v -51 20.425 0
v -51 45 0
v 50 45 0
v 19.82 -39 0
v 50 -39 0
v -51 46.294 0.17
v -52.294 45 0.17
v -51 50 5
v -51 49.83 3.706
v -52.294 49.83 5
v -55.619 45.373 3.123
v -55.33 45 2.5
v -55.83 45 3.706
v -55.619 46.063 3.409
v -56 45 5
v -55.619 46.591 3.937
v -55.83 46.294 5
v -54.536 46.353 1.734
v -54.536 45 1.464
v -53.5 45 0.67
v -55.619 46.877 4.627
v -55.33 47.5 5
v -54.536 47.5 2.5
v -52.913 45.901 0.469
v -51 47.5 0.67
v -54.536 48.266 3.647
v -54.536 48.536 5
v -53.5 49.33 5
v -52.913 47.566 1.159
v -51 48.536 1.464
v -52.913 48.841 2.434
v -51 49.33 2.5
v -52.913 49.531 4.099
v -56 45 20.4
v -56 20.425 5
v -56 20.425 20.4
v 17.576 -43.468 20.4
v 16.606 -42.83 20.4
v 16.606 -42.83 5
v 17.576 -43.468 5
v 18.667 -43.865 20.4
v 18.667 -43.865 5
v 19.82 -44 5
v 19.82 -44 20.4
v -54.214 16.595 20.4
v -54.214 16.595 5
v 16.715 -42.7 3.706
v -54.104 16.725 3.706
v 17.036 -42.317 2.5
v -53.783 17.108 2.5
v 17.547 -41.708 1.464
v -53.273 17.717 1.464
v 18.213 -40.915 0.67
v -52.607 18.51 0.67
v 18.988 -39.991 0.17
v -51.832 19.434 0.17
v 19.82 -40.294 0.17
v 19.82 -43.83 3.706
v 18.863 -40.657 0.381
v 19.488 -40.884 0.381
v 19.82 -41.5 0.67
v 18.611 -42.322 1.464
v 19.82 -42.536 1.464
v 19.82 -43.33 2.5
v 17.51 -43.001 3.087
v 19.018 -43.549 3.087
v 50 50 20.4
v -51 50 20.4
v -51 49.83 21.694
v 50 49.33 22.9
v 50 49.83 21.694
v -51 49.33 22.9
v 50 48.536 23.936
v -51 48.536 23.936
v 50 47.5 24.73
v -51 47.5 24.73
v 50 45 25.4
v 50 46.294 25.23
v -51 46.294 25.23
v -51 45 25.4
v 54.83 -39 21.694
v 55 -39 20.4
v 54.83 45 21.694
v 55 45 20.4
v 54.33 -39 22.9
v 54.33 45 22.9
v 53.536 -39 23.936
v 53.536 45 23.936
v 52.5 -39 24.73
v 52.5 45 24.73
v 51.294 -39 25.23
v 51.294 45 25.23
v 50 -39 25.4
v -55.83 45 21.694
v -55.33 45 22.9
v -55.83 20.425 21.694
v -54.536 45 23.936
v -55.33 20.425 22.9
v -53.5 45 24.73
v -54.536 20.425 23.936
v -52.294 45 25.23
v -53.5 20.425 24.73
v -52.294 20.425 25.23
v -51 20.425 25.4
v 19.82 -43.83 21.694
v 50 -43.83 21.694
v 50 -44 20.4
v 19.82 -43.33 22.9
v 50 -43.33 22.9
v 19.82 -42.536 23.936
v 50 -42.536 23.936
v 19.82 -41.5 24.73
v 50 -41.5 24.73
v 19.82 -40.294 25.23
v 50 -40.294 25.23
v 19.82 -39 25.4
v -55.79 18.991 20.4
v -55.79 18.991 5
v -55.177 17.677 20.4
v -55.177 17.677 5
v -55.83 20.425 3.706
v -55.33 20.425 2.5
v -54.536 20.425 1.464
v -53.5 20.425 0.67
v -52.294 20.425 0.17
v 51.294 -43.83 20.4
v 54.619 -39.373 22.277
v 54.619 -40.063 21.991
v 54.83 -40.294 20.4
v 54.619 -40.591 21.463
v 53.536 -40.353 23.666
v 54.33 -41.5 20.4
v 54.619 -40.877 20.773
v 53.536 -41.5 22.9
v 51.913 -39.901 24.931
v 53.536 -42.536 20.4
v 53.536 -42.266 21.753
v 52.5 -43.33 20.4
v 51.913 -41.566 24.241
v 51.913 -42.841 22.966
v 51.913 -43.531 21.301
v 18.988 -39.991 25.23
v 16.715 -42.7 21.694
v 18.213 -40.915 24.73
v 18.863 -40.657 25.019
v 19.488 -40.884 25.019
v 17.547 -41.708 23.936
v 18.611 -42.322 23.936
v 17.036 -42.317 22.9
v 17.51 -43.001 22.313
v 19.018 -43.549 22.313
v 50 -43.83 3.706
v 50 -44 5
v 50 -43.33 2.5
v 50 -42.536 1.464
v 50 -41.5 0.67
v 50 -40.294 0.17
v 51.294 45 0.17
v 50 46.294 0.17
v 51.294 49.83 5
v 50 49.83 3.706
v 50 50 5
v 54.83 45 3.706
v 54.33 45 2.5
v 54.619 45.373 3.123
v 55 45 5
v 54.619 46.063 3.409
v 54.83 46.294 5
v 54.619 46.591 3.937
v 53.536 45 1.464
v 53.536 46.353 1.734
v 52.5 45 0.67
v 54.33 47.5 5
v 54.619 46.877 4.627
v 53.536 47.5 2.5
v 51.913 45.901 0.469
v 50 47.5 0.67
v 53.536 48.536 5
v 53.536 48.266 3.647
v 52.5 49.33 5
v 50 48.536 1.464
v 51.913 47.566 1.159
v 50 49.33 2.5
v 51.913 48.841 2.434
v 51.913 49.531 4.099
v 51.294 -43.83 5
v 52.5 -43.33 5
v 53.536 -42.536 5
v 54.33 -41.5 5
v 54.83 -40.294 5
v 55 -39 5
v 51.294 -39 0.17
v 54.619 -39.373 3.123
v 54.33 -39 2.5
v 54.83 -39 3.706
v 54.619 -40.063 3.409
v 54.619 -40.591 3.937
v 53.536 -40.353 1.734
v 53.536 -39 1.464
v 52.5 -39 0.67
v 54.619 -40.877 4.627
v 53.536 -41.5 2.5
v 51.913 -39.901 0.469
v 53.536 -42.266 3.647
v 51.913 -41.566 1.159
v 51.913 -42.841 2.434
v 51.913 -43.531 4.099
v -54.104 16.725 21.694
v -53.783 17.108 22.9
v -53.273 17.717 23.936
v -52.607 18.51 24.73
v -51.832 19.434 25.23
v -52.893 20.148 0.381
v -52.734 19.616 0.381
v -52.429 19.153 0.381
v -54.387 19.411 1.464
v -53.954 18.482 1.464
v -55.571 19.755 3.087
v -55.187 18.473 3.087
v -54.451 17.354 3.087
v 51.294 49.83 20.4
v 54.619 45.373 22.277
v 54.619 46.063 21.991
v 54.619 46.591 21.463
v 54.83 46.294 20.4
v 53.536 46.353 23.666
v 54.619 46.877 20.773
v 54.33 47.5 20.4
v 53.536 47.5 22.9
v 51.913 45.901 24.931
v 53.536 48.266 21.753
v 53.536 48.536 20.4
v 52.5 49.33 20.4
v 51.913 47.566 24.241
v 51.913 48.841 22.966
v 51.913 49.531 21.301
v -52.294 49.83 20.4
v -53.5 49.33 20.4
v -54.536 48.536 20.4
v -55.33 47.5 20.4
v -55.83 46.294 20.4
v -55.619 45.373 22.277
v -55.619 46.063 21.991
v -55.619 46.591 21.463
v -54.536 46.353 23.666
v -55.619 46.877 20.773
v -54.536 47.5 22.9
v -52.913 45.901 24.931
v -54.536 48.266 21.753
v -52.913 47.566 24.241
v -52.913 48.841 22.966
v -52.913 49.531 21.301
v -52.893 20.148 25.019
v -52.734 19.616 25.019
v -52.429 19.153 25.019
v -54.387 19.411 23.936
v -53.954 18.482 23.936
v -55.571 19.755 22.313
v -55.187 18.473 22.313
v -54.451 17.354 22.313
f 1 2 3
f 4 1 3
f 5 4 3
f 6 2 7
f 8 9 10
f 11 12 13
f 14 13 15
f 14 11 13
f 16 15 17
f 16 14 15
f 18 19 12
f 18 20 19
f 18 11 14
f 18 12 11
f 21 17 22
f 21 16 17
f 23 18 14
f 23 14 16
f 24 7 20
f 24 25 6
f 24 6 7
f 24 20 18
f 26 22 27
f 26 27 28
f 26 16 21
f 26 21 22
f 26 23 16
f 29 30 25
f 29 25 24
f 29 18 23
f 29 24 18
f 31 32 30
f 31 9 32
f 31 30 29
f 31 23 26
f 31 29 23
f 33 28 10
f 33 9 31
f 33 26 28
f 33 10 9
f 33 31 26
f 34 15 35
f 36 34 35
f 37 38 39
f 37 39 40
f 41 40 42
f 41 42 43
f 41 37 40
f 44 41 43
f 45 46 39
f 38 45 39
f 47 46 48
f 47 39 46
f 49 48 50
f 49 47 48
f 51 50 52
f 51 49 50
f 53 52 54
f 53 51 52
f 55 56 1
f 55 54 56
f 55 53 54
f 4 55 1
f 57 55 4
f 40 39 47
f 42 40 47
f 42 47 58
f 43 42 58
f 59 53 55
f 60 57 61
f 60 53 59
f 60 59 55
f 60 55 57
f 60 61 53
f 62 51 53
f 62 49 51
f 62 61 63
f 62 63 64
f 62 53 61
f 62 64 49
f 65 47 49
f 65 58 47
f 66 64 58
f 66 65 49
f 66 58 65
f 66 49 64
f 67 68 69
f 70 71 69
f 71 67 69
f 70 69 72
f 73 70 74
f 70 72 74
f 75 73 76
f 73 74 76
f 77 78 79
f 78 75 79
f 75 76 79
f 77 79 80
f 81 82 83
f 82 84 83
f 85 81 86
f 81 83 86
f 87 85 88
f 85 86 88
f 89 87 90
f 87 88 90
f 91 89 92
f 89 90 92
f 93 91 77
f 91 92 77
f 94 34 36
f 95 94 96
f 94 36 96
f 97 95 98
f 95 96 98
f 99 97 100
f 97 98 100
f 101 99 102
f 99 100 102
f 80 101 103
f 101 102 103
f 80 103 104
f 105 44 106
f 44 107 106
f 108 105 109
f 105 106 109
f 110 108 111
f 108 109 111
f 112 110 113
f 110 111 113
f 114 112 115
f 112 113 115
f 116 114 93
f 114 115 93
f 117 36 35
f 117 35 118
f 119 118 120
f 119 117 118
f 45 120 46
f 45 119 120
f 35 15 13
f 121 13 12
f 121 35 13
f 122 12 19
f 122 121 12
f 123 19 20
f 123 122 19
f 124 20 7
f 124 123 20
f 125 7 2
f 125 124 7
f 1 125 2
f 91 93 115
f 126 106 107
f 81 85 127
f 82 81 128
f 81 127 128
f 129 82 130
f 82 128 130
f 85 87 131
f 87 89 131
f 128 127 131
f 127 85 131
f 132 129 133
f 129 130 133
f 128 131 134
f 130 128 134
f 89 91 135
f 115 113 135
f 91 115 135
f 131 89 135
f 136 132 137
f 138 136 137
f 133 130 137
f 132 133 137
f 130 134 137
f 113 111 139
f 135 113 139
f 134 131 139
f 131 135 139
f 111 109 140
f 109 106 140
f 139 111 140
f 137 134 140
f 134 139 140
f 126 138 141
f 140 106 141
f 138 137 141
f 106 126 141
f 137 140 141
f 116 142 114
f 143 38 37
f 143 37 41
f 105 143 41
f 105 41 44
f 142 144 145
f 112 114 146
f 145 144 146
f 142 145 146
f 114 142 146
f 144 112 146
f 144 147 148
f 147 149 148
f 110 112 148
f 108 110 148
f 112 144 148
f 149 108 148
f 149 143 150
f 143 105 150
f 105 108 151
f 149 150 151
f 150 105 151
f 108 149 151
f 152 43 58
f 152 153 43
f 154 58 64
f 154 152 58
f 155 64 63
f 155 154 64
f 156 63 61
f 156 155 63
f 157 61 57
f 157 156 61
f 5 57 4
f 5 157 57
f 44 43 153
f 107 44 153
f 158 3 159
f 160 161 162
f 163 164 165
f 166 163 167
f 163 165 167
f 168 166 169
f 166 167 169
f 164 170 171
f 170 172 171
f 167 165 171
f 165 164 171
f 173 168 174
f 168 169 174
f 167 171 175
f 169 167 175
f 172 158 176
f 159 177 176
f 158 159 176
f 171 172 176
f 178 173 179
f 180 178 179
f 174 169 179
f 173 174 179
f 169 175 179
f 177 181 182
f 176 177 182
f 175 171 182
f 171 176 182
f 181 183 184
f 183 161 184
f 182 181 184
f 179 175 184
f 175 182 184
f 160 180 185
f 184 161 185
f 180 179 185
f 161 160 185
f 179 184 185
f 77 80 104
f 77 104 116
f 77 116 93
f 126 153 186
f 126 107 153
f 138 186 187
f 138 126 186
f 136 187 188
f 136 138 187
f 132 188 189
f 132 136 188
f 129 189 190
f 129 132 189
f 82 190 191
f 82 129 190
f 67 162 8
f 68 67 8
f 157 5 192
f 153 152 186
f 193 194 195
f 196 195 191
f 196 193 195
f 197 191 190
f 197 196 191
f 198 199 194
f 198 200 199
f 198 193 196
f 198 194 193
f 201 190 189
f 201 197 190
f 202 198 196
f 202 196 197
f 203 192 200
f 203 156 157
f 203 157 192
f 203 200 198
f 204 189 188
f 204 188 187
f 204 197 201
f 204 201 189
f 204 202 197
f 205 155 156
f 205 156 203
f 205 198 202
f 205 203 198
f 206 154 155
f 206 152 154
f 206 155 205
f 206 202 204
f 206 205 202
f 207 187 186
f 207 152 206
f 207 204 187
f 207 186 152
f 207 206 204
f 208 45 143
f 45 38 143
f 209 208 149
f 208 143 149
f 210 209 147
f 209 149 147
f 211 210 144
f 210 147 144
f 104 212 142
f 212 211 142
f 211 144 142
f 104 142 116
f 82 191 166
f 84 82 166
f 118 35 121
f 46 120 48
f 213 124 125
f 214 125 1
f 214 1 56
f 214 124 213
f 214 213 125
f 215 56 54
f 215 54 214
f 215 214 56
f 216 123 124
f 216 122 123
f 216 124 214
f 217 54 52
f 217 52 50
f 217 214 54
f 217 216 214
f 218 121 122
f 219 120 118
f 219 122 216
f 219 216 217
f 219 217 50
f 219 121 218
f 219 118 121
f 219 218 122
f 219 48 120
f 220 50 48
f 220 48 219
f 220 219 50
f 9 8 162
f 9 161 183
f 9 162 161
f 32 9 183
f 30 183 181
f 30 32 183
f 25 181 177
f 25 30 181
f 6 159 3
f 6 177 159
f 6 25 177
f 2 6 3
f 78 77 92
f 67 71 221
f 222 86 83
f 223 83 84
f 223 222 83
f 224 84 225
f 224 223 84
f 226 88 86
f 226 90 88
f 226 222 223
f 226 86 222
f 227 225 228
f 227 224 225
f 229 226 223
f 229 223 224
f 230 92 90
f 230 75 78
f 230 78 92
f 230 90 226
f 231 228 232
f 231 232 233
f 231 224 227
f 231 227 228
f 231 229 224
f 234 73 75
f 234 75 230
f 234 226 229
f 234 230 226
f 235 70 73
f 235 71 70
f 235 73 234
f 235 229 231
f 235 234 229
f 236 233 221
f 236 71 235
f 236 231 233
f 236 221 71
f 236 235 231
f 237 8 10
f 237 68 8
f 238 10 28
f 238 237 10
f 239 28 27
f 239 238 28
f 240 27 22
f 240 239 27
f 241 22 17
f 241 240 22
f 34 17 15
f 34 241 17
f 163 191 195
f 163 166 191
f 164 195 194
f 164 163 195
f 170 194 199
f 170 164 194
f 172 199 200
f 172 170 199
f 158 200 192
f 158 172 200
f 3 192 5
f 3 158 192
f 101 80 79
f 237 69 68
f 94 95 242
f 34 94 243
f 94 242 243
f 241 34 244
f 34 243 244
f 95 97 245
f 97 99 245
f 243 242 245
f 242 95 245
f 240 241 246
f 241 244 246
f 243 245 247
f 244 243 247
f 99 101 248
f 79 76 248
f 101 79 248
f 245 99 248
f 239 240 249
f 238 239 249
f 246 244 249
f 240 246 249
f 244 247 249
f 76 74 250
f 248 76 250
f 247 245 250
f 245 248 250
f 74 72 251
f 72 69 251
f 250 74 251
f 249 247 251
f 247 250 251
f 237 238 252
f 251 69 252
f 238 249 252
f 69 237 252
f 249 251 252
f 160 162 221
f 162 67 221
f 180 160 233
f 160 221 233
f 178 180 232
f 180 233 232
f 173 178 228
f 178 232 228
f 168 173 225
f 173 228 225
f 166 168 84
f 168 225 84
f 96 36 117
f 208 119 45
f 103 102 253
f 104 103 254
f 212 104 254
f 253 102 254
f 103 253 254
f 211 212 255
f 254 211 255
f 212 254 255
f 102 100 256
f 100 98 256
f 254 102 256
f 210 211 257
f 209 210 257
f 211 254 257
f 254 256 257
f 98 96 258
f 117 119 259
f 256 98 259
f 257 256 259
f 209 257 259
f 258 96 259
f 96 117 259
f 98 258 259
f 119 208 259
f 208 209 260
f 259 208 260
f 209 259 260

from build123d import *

# Parameters (mm, degrees)
F1_DEPTH = 25.4
F2_R     = 5


with BuildPart() as f1:
    # F0 (on Top) → F1 (new body)
    with BuildSketch(Plane.XY):
        Polygon((55, 50), (-56, 50), (-56, 18.093373), (18, -44), (55, -44), align=None)
    extrude(amount=F1_DEPTH)

    # F2
    f2_edges = [f1.edges().sort_by_distance(p)[0] for p in [
        (-0.5, 50, 0),
        (-56, 34.046686, 0),
        (-19, -12.953314, 0),
        (36.5, -44, 0),
        (55, 3, 0),
        (-0.5, 50, 25.4),
        (-56, 34.046686, 25.4),
        (-19, -12.953314, 25.4),
        (36.5, -44, 25.4),
        (55, 3, 25.4),
        (-56, 50, 12.7),
        (55, 50, 12.7),
        (-56, 18.093373, 12.7),
        (18, -44, 12.7),
        (55, -44, 12.7),
    ]]
    fillet(f2_edges, radius=F2_R)


solid = f1.part
